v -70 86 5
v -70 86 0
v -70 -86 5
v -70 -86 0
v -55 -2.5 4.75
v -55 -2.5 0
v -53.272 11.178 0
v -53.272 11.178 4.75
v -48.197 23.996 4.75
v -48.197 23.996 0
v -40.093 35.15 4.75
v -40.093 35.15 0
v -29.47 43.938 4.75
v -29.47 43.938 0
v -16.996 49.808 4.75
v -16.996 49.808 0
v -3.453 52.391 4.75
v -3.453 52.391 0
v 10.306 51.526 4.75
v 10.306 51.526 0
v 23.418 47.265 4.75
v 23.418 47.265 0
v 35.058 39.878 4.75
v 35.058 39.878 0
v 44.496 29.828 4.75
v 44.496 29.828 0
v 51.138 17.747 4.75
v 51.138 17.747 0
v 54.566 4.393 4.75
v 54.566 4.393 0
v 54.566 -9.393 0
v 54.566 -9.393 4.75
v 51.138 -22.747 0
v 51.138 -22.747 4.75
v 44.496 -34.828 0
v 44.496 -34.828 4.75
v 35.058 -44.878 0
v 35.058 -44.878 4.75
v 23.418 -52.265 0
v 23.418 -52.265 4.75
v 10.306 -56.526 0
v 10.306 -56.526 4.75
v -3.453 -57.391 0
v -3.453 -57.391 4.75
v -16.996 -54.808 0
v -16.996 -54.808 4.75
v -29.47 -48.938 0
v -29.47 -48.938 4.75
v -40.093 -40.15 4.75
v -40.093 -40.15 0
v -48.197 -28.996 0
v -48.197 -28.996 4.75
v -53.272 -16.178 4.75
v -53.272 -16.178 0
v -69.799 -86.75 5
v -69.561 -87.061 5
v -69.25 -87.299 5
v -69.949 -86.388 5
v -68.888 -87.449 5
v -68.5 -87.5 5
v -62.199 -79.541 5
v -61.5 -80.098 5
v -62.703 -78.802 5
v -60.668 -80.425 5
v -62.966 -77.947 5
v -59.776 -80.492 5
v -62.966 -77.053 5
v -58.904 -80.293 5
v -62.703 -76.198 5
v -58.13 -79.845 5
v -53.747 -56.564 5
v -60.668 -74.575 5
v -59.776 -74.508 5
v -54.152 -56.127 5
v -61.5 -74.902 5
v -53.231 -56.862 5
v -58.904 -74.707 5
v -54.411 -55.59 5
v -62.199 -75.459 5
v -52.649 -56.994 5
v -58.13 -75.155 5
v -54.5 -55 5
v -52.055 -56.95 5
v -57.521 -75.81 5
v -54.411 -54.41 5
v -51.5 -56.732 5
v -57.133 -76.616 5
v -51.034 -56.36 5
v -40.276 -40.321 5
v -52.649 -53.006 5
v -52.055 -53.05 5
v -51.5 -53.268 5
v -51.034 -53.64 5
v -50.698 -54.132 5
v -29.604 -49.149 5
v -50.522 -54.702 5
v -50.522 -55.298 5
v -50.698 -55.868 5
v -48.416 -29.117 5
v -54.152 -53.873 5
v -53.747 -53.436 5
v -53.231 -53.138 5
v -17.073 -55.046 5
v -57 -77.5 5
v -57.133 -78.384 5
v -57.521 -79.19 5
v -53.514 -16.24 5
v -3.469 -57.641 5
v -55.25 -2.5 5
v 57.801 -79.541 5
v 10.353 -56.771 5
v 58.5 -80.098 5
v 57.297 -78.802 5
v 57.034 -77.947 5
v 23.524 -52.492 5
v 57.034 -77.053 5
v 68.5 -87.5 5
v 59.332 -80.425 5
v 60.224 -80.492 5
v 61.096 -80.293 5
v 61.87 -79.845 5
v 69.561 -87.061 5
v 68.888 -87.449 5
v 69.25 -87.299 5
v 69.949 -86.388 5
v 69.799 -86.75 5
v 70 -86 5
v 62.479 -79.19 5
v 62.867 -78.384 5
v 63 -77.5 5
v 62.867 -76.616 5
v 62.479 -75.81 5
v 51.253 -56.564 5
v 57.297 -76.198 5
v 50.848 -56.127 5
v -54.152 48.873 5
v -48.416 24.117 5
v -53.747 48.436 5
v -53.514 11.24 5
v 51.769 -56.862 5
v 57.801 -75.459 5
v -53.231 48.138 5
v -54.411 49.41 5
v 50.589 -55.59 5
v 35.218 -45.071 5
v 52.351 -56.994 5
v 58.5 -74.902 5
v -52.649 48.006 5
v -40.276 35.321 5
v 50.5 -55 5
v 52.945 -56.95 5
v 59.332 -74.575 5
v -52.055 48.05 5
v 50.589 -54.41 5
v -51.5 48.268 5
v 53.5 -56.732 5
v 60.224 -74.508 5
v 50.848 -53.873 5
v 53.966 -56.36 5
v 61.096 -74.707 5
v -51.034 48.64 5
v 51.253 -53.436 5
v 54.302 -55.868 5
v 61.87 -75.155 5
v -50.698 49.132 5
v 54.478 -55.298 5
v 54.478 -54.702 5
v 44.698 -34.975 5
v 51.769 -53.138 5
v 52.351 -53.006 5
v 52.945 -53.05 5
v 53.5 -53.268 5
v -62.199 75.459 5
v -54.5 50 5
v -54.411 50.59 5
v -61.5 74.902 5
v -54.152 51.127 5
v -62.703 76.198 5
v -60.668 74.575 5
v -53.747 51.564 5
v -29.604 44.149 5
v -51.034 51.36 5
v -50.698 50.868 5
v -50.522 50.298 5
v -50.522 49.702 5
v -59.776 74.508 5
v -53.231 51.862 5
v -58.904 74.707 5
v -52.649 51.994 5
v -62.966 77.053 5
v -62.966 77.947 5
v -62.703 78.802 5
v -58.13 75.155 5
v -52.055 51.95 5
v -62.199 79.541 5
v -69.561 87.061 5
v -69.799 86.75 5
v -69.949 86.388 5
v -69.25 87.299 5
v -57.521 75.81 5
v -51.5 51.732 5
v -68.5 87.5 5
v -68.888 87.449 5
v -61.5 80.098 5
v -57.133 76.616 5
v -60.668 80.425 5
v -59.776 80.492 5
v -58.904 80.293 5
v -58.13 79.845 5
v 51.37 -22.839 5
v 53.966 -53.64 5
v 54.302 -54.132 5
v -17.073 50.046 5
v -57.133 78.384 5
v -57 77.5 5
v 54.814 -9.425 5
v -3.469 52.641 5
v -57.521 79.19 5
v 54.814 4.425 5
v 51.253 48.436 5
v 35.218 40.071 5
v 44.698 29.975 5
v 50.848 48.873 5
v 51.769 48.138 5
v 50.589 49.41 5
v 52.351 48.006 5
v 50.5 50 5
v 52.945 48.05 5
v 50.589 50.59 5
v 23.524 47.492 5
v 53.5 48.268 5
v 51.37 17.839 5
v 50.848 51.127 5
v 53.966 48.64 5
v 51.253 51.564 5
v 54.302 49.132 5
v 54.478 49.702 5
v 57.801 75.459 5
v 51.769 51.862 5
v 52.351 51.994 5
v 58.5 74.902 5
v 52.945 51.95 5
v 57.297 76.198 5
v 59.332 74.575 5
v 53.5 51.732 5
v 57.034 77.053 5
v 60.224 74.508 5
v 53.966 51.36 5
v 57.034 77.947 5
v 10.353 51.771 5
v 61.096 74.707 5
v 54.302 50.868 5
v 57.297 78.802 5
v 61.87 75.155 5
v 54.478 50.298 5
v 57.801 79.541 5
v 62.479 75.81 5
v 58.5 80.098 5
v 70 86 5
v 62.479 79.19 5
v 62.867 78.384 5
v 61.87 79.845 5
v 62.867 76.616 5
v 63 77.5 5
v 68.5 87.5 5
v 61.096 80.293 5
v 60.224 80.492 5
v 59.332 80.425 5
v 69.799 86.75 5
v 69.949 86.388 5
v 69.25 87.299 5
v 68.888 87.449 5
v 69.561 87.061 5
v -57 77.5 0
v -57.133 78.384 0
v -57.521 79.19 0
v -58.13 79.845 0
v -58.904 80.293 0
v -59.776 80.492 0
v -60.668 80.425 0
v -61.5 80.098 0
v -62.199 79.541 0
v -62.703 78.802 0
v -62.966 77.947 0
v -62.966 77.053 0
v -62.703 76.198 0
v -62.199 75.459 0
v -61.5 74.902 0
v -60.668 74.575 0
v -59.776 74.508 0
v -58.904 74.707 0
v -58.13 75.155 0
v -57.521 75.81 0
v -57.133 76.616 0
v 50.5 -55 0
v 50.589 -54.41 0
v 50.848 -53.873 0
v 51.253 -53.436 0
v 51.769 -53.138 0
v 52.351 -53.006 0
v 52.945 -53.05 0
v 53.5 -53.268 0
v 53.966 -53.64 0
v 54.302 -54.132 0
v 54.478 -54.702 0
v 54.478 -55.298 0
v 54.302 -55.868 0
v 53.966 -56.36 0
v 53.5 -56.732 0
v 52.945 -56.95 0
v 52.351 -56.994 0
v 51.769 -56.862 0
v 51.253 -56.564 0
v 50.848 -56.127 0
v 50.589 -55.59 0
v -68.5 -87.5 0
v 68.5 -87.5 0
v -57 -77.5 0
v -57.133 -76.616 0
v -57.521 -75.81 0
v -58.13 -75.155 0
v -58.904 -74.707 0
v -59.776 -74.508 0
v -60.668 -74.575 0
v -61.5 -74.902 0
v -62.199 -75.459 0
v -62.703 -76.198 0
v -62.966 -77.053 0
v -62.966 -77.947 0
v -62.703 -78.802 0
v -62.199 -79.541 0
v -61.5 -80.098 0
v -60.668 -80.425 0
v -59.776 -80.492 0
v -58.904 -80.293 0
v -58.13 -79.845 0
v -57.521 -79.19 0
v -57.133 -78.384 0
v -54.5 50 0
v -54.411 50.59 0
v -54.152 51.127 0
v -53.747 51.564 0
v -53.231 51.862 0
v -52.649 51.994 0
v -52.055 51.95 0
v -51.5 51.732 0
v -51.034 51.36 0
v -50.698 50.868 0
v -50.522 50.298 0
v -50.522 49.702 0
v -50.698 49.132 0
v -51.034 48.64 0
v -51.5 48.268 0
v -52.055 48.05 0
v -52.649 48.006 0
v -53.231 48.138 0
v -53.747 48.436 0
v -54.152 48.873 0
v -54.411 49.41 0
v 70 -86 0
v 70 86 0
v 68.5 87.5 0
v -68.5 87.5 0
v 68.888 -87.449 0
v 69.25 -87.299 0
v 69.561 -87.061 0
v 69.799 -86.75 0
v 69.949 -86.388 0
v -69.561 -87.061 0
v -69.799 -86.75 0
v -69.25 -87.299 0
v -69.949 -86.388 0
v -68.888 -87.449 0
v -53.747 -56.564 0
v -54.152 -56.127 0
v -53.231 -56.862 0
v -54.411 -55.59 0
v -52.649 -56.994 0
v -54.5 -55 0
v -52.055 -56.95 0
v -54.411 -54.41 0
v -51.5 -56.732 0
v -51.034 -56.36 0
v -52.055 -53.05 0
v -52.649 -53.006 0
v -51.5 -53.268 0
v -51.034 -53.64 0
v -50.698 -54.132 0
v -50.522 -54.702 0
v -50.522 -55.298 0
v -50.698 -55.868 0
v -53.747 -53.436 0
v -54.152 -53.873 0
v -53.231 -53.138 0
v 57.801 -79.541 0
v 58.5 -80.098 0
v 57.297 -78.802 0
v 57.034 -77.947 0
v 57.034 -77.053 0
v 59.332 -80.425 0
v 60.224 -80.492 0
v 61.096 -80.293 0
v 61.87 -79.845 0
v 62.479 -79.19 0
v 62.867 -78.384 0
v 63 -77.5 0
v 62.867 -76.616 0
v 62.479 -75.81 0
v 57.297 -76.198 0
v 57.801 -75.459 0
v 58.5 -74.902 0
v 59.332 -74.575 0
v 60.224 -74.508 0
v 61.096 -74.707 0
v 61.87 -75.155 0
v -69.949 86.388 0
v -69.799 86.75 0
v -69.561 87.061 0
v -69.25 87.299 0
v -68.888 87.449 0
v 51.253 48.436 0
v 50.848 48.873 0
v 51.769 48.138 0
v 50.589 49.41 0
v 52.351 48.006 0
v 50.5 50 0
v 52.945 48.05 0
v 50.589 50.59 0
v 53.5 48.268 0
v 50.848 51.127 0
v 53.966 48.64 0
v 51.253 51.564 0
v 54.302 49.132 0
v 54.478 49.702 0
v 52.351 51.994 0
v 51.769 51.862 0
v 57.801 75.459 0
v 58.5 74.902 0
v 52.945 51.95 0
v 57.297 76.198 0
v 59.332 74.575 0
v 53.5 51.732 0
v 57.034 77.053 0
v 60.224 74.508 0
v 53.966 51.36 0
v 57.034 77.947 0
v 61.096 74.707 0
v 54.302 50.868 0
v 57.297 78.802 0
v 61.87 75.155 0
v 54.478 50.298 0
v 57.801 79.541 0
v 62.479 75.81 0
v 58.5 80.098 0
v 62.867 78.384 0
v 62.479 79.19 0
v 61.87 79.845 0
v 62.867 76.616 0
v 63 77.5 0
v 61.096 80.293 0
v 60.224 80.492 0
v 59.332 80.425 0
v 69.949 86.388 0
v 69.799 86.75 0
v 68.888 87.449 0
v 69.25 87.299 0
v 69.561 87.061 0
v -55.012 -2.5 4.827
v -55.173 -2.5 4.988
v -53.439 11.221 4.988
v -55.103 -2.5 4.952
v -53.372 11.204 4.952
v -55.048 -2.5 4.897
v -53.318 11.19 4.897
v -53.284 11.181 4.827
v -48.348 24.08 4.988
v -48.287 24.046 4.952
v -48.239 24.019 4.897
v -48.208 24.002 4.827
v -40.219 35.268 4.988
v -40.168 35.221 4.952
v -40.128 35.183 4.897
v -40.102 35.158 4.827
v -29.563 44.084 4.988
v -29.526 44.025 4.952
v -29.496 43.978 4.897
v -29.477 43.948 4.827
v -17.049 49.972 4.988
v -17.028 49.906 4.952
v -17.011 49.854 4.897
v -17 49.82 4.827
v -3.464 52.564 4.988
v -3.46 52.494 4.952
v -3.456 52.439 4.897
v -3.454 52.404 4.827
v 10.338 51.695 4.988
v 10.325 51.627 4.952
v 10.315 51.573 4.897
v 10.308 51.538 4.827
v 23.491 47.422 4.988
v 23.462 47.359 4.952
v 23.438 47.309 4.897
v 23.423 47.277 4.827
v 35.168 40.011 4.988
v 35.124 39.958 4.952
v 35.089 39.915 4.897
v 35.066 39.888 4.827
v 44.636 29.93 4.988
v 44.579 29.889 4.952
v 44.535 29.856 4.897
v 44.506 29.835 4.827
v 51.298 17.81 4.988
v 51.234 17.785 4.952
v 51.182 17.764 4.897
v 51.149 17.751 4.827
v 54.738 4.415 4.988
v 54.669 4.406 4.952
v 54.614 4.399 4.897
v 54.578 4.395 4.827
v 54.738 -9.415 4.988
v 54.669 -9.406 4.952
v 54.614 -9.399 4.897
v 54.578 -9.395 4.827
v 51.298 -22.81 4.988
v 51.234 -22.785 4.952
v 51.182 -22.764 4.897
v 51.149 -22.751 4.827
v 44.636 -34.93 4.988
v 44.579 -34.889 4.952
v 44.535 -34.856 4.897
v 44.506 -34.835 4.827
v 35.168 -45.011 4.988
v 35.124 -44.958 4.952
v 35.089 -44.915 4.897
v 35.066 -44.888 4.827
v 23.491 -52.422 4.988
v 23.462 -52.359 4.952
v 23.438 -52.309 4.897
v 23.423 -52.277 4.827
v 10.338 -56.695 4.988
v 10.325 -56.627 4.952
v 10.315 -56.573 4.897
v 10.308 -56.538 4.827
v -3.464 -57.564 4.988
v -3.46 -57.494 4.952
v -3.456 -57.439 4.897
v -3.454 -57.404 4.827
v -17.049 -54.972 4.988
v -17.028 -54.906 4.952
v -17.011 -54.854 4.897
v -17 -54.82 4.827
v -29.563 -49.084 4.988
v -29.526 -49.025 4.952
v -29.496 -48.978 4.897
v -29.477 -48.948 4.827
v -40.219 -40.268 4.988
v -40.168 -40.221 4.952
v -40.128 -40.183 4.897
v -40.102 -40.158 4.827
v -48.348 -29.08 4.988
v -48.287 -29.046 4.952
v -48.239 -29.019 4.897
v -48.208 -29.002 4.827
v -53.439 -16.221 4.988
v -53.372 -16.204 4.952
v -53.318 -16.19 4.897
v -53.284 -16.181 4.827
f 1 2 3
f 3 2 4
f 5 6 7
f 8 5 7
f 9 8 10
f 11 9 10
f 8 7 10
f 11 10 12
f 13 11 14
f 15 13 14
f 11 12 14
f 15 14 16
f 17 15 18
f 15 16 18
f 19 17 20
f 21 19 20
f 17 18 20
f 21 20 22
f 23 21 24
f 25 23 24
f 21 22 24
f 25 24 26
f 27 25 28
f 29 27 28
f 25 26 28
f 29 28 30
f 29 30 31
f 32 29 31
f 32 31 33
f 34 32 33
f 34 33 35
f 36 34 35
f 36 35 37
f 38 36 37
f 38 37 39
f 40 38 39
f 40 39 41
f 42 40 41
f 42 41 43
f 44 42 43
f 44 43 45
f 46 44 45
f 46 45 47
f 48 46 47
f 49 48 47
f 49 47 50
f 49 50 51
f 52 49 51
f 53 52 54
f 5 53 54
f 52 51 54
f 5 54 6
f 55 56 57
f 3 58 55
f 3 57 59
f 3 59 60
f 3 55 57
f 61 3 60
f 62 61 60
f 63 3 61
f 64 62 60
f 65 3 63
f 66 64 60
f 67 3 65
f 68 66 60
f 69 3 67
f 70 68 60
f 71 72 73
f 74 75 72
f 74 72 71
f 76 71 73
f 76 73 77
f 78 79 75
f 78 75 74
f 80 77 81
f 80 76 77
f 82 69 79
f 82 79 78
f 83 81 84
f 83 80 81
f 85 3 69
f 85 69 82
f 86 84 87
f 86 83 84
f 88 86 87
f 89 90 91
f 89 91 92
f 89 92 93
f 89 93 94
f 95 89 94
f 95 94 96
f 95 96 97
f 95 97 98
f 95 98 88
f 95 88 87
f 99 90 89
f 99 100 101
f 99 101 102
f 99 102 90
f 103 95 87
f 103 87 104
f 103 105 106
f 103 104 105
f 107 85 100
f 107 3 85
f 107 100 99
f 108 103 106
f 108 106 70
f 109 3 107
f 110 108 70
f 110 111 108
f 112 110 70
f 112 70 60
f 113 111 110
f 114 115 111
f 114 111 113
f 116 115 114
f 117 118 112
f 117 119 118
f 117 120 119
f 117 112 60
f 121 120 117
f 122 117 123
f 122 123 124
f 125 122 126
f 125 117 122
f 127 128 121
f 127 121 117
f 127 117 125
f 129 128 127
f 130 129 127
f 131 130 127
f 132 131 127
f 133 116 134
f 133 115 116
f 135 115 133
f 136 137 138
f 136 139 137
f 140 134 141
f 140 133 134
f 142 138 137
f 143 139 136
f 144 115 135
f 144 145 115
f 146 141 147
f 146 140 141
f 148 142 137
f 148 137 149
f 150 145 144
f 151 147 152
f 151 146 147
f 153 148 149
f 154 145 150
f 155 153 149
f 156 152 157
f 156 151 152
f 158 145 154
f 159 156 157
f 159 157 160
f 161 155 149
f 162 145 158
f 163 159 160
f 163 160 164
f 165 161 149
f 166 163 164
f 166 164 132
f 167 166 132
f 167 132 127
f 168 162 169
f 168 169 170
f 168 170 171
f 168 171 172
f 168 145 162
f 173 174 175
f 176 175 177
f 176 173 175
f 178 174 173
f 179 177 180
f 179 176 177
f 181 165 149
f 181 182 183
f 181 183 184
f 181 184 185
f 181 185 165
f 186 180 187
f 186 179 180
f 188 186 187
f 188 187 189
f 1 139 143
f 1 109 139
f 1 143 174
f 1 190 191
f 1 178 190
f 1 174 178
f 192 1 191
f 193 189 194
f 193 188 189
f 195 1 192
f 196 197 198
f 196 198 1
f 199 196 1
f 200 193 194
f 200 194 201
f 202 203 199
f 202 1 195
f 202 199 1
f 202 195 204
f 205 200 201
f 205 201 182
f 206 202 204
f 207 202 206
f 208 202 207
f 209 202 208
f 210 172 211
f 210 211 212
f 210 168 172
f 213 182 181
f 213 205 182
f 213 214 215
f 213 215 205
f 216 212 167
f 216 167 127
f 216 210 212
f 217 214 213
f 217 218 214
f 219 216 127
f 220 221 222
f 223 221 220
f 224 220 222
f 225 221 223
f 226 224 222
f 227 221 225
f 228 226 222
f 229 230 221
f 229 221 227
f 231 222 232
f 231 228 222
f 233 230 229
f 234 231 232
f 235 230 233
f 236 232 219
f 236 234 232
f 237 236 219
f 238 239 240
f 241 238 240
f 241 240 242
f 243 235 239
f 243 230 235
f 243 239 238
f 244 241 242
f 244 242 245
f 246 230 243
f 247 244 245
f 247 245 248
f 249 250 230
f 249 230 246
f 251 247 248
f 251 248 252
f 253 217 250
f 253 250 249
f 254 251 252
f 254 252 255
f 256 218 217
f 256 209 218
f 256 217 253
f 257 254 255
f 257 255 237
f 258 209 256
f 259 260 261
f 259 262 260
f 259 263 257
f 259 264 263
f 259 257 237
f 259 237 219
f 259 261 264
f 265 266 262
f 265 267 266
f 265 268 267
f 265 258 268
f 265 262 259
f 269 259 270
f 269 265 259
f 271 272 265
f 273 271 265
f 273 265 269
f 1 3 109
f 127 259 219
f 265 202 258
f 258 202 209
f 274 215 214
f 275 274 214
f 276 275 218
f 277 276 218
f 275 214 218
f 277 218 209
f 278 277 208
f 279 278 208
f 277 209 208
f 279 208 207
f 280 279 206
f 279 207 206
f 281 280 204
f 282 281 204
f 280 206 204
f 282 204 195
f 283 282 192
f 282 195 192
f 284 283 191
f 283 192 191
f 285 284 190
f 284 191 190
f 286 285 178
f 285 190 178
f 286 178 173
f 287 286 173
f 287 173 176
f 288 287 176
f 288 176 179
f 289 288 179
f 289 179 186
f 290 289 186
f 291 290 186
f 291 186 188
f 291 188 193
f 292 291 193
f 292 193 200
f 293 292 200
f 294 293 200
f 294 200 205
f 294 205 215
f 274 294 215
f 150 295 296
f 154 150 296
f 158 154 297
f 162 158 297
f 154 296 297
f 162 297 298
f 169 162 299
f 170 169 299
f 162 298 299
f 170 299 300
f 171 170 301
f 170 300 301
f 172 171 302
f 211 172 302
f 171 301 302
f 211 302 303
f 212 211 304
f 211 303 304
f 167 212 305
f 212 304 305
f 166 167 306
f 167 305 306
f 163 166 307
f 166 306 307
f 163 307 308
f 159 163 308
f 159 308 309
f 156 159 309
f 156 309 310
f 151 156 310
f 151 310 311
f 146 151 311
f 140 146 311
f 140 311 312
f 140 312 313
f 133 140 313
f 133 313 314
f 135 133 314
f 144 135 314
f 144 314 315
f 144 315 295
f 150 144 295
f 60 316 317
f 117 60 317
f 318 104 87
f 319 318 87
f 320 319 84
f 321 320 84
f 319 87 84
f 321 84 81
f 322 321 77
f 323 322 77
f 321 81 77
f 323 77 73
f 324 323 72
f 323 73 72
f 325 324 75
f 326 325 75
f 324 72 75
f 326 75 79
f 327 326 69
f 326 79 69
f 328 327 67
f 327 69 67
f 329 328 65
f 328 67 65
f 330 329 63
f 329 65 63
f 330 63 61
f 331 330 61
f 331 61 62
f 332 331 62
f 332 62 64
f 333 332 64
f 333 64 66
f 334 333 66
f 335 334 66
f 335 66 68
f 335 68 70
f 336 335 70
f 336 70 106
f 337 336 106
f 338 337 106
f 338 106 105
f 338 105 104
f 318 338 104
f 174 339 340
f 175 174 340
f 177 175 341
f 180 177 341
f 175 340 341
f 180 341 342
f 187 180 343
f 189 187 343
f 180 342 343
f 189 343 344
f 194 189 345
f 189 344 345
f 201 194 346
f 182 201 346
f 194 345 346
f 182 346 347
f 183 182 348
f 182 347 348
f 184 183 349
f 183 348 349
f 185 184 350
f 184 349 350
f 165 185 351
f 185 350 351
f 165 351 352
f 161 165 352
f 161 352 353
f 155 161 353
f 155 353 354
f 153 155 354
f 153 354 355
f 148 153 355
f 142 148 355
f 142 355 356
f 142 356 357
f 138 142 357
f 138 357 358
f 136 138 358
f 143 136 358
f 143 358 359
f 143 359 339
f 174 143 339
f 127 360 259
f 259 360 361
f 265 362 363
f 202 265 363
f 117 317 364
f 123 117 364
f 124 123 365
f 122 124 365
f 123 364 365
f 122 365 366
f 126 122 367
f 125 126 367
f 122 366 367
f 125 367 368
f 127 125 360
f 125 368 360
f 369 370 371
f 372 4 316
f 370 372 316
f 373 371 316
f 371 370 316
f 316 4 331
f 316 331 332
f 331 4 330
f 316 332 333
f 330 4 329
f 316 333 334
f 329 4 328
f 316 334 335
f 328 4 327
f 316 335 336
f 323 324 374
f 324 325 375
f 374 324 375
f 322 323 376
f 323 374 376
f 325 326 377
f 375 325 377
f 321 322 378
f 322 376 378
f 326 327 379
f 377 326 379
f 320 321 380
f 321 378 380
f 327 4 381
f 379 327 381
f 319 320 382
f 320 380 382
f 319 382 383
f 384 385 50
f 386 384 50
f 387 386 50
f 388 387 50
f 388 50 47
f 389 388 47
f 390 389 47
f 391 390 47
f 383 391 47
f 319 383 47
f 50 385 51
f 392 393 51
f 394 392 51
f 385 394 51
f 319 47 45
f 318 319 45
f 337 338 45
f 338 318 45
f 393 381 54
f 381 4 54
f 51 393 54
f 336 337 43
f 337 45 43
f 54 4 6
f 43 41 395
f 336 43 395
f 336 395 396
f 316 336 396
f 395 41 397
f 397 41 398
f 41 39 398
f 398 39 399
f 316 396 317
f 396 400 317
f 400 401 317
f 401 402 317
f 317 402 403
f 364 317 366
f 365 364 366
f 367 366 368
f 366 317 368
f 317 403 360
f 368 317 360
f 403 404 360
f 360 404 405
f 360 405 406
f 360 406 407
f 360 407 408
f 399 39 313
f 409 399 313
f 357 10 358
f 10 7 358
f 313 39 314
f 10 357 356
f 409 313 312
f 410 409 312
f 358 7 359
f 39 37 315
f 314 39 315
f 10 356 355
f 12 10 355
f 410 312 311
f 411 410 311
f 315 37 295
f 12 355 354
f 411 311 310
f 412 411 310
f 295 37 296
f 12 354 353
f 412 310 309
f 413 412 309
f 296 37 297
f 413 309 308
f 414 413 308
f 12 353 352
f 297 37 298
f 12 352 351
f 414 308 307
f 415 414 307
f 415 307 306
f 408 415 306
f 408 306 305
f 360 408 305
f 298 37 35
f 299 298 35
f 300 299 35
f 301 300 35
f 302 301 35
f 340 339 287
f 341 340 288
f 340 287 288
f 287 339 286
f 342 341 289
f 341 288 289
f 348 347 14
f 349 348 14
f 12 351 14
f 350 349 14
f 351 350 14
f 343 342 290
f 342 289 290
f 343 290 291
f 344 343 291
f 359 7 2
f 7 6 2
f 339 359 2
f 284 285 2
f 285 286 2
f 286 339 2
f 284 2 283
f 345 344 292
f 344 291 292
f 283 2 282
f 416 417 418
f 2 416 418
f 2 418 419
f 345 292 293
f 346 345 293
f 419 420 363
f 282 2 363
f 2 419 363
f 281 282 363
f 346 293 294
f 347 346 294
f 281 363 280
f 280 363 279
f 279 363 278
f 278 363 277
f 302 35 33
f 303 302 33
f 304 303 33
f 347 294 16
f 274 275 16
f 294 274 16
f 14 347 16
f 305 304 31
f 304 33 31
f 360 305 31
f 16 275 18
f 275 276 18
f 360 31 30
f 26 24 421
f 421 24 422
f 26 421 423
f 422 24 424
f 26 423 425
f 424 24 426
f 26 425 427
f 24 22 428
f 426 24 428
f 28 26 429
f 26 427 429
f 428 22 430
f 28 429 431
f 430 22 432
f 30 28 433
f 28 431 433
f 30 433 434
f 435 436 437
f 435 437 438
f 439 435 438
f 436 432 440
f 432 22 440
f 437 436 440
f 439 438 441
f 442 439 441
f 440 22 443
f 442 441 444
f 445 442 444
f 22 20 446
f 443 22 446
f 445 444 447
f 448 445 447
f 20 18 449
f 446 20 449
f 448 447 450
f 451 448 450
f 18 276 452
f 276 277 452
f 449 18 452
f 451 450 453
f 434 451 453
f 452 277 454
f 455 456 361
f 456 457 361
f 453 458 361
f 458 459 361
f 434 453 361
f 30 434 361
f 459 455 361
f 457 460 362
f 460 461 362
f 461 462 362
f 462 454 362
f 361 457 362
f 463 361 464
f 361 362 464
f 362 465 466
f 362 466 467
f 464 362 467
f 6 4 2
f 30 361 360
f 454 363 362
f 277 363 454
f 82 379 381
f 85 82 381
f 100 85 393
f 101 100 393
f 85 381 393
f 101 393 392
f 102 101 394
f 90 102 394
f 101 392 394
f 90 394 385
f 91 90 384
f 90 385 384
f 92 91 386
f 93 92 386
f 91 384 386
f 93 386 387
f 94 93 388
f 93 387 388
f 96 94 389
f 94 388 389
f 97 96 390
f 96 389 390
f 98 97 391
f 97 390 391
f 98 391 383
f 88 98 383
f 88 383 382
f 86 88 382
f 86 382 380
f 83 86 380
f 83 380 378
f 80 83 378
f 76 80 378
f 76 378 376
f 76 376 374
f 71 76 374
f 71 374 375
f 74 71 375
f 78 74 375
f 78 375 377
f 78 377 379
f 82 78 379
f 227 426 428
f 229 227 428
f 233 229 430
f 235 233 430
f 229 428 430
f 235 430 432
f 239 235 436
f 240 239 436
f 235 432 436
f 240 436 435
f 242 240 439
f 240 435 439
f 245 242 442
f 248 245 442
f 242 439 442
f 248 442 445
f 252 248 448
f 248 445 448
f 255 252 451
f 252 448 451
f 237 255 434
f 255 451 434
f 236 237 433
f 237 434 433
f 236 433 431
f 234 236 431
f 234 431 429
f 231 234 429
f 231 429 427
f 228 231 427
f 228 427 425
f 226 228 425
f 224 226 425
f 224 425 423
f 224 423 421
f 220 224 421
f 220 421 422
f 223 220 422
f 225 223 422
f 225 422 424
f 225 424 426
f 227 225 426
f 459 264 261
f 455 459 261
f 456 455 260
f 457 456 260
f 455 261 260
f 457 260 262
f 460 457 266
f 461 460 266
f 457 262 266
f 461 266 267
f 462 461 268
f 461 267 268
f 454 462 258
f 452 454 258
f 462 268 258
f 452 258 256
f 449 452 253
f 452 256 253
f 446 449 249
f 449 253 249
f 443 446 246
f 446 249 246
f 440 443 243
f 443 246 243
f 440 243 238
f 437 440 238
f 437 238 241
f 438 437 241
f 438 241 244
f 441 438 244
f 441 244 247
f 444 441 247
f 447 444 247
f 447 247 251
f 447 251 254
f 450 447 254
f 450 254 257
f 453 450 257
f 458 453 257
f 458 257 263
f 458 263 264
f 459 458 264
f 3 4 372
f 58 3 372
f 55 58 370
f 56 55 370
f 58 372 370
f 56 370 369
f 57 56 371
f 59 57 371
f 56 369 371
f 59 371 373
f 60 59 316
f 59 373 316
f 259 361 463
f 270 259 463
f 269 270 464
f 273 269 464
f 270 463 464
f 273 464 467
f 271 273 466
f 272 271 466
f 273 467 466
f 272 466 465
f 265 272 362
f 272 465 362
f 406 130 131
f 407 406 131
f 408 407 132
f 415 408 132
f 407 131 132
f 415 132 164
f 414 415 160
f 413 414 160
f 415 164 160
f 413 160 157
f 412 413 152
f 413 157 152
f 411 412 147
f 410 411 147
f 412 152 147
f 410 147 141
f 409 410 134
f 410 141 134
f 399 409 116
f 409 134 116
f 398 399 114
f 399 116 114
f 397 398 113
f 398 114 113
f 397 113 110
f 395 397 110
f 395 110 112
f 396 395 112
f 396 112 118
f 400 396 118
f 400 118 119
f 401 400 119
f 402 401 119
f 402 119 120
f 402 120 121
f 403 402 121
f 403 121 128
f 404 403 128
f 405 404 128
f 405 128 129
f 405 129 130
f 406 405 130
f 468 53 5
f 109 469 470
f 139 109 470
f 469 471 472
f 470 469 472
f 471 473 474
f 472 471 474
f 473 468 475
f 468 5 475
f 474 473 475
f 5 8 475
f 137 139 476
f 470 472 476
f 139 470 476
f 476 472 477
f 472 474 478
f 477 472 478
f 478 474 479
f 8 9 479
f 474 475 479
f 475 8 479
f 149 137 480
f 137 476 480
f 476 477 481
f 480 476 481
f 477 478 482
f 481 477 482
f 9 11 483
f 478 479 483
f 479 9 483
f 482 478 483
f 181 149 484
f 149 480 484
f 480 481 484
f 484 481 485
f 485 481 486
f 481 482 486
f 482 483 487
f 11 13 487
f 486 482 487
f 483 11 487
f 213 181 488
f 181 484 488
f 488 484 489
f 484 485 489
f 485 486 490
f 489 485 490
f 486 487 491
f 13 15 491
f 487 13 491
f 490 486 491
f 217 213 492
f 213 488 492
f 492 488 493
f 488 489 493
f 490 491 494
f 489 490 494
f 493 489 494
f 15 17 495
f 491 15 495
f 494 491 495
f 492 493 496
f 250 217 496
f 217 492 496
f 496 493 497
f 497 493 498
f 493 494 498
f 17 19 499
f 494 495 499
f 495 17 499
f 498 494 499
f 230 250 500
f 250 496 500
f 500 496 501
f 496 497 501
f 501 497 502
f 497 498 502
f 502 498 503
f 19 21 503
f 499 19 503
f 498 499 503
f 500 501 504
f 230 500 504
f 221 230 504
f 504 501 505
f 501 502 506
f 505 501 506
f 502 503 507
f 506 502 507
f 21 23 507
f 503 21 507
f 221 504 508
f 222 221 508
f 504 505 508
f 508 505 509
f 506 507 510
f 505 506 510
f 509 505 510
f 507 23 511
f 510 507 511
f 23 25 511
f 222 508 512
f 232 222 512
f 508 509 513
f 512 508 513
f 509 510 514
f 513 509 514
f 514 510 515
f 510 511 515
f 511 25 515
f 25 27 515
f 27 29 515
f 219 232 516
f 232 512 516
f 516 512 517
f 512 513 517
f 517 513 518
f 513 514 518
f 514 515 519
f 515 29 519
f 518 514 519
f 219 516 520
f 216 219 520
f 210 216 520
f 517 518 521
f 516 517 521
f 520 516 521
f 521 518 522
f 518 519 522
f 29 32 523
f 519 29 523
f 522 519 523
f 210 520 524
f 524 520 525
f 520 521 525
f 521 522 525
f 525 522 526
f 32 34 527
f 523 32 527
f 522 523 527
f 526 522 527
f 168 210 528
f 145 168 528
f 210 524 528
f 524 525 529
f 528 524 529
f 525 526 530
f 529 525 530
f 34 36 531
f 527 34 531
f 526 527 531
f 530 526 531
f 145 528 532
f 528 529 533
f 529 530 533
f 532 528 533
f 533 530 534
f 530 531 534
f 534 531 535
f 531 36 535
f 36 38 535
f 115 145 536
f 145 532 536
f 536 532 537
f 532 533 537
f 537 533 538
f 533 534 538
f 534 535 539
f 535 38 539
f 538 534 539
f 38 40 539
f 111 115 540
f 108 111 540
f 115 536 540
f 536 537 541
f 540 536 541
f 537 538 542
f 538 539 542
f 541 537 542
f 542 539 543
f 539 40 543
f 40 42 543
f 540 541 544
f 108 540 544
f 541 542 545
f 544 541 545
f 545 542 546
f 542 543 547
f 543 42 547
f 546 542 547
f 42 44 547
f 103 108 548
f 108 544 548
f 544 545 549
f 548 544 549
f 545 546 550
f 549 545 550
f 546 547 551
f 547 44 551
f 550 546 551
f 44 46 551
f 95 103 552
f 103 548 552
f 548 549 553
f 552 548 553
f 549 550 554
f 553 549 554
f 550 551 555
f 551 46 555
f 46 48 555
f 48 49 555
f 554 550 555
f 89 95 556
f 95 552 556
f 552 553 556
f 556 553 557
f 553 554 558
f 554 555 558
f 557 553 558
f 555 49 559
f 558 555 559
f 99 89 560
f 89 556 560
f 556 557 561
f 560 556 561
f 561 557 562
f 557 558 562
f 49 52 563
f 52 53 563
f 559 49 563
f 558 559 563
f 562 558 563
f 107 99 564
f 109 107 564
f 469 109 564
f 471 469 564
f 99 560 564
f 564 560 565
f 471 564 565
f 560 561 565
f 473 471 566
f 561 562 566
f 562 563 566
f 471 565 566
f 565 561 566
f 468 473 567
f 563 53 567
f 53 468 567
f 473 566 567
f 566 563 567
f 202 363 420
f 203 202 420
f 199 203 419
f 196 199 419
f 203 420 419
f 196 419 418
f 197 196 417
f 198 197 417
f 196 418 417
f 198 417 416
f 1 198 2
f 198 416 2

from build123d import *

# Parameters (mm, degrees)
BOSS_EXTRU_1_DEPTH      = 5
ESQUISSE4_R             = 3
ENL_V_MAT_EXTRU_3_DEPTH = 10
ESQUISSE5_R             = 2
ESQUISSE5_R_2           = 55
ENL_V_MAT_EXTRU_4_DEPTH = 10
CONG_1_R                = 0.25


with BuildPart() as part:
    # Esquisse1 → Boss.-Extru.1 (new body)
    with BuildSketch(Plane.XY):
        with BuildLine():
            Line((-68, 87.5), (-68.5, 87.5))
            ThreePointArc((-68.5, 87.5), (-69.560660172, 87.060660172), (-70, 86))
            Line((-70, 86), (-70, 75.5))
            Line((-70, 75.5), (-70, -85.5))
            Line((-70, -85.5), (-70, -86))
            ThreePointArc((-70, -86), (-69.560660172, -87.060660172), (-68.5, -87.5))
            Line((-68.5, -87.5), (-68, -87.5))
            Line((-68, -87.5), (68, -87.5))
            Line((68, -87.5), (68.5, -87.5))
            ThreePointArc((68.5, -87.5), (69.560660172, -87.060660172), (70, -86))
            Line((70, -86), (70, -85.5))
            Line((70, -85.5), (70, 75.5))
            Line((70, 75.5), (70, 86))
            ThreePointArc((70, 86), (69.560660172, 87.060660172), (68.5, 87.5))
            Line((68.5, 87.5), (68, 87.5))
            Line((68, 87.5), (-68, 87.5))
        make_face()
    extrude(amount=BOSS_EXTRU_1_DEPTH)

    # Esquisse4 → Enlèv. mat.-Extru.3 (cut)
    with BuildSketch(Plane.XY.offset(5)):
        with Locations((-60, -77.5)):
            Circle(ESQUISSE4_R)
        with Locations((60, -77.5)):
            Circle(ESQUISSE4_R)
        with Locations((-60, 77.5)):
            Circle(ESQUISSE4_R)
        with Locations((60, 77.5)):
            Circle(ESQUISSE4_R)
    extrude(amount=-ENL_V_MAT_EXTRU_3_DEPTH, mode=Mode.SUBTRACT)

    # Esquisse5 → Enlèv. mat.-Extru.4 (cut)
    with BuildSketch(Plane(origin=(0, 0, 0), x_dir=(-1, 0, 0), z_dir=(0, 0, -1))):
        with Locations((-52.5, 50)):
            Circle(ESQUISSE5_R)
        with Locations((52.5, 50)):
            Circle(ESQUISSE5_R)
        with Locations((52.5, -55)):
            Circle(ESQUISSE5_R)
        with Locations((-52.5, -55)):
            Circle(ESQUISSE5_R)
        with Locations((0, -2.5)):
            Circle(ESQUISSE5_R_2)
    extrude(amount=-ENL_V_MAT_EXTRU_4_DEPTH, mode=Mode.SUBTRACT)

    # Congé1
    cong_1_edges = [part.edges().sort_by_distance(p)[0] for p in [
        (55, -2.5, 5),
    ]]
    fillet(cong_1_edges, radius=CONG_1_R)


solid = part.part
